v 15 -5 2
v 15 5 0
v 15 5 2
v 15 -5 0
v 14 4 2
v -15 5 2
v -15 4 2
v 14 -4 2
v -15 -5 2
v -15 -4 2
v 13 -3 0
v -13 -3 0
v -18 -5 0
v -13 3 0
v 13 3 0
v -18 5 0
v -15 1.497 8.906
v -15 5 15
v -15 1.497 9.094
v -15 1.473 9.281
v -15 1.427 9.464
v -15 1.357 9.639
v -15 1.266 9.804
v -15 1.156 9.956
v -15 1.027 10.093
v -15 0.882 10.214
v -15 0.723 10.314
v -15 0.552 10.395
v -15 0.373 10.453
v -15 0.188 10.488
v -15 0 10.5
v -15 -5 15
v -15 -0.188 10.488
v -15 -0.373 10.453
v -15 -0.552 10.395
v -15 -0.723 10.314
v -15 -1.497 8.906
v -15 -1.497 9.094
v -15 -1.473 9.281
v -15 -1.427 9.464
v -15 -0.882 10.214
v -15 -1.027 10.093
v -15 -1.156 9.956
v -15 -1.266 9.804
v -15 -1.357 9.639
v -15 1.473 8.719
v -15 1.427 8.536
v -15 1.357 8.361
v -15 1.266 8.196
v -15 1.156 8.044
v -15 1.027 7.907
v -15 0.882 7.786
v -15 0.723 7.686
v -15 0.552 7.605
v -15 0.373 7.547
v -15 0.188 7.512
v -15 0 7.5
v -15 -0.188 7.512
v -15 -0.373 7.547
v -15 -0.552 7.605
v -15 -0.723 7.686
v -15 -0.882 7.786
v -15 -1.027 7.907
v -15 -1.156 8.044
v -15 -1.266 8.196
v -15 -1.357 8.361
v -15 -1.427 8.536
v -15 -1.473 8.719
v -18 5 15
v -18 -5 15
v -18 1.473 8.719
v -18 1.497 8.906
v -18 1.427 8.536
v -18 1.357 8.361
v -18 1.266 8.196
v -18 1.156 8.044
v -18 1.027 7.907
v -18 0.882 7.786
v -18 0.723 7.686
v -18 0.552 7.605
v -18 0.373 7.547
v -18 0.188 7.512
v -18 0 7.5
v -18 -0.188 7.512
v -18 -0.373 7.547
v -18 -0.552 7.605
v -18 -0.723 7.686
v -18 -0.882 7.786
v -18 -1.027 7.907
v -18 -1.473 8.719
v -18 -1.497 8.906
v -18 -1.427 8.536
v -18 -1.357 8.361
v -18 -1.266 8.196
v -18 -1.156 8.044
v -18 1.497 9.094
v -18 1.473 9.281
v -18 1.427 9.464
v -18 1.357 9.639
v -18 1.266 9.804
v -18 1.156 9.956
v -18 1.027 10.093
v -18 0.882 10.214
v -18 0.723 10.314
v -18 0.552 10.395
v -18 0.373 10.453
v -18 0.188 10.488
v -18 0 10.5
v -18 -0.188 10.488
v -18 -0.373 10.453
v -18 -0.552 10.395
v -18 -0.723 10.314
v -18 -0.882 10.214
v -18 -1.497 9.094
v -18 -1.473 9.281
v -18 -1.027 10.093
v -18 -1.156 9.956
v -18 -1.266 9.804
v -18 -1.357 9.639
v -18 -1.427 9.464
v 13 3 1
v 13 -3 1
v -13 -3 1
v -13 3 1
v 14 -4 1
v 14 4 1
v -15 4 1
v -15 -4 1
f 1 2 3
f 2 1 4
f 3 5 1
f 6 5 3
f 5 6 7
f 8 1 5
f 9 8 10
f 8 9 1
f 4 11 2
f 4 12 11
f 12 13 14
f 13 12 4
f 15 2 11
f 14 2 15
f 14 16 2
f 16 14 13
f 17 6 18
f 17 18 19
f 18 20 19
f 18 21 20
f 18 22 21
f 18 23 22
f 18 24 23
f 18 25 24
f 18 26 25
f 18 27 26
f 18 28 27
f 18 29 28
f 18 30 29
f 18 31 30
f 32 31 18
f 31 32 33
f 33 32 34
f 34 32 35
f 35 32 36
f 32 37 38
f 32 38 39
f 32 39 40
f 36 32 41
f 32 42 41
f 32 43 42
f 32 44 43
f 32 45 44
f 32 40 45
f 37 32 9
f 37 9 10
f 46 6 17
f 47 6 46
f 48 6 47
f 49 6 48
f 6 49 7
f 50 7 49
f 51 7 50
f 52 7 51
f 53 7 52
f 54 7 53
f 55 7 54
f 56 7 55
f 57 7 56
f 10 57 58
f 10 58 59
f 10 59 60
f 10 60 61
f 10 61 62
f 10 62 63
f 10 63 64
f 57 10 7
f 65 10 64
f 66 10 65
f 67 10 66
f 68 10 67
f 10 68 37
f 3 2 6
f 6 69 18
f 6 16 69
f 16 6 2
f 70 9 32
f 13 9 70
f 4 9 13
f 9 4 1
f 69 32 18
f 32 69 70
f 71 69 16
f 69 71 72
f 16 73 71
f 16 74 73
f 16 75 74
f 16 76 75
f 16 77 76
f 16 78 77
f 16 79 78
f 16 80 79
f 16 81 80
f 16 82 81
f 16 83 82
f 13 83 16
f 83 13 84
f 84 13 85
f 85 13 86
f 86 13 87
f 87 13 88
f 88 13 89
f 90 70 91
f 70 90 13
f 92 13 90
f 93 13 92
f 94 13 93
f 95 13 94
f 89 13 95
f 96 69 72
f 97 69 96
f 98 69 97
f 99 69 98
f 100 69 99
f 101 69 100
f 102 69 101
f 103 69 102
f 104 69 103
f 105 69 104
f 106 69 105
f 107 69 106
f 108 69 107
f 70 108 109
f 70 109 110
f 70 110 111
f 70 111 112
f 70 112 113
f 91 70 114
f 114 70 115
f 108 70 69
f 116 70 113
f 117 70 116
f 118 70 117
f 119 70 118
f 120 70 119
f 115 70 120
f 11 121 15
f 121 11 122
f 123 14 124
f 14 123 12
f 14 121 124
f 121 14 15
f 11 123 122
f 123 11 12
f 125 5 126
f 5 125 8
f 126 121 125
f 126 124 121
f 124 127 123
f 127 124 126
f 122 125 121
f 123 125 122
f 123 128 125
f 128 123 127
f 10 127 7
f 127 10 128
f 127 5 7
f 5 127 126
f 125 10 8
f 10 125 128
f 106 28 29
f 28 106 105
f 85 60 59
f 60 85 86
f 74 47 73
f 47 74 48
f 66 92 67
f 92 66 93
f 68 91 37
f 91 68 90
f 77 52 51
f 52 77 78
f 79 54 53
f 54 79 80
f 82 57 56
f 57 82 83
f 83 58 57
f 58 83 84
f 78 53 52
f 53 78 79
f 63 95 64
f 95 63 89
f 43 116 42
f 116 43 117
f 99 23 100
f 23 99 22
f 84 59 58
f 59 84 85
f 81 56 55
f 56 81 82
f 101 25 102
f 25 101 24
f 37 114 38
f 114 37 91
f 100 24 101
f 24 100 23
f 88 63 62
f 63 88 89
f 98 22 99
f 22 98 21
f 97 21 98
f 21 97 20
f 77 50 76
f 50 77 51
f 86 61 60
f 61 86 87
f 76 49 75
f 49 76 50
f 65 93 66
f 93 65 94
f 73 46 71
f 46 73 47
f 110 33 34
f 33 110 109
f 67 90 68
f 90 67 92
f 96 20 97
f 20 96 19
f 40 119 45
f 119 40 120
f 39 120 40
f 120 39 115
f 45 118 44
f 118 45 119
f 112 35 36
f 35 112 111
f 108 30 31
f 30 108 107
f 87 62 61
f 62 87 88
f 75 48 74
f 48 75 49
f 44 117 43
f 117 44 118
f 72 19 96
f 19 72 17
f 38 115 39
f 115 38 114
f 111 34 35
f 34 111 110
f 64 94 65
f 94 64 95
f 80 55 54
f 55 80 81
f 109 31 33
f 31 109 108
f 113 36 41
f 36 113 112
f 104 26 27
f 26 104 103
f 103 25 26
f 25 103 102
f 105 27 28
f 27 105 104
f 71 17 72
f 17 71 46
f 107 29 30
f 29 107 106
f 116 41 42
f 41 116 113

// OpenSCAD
$fn = 50;


difference() {
	union() {
		translate(v = [-15.0000000000, -5.0000000000, 0]) {
			rotate(a = [0, 0, 0]) {
				cube(size = [30, 10, 2]);
			}
		}
		translate(v = [-18.0000000000, -5.0000000000, 0]) {
			rotate(a = [0, 0, 0]) {
				cube(size = [3, 10, 15]);
			}
		}
	}
	union() {
		translate(v = [-13.0000000000, -3.0000000000, 0]) {
			rotate(a = [0, 0, 0]) {
				cube(size = [26, 6, 2]);
			}
		}
		translate(v = [-15.0000000000, -4.0000000000, 1]) {
			rotate(a = [0, 0, 0]) {
				cube(size = [29, 8, 1]);
			}
		}
		#translate(v = [-25.0000000000, 0, 9]) {
			rotate(a = [0, 90, 0]) {
				cylinder(h = 20, r = 1.5000000000);
			}
		}
	}
}
